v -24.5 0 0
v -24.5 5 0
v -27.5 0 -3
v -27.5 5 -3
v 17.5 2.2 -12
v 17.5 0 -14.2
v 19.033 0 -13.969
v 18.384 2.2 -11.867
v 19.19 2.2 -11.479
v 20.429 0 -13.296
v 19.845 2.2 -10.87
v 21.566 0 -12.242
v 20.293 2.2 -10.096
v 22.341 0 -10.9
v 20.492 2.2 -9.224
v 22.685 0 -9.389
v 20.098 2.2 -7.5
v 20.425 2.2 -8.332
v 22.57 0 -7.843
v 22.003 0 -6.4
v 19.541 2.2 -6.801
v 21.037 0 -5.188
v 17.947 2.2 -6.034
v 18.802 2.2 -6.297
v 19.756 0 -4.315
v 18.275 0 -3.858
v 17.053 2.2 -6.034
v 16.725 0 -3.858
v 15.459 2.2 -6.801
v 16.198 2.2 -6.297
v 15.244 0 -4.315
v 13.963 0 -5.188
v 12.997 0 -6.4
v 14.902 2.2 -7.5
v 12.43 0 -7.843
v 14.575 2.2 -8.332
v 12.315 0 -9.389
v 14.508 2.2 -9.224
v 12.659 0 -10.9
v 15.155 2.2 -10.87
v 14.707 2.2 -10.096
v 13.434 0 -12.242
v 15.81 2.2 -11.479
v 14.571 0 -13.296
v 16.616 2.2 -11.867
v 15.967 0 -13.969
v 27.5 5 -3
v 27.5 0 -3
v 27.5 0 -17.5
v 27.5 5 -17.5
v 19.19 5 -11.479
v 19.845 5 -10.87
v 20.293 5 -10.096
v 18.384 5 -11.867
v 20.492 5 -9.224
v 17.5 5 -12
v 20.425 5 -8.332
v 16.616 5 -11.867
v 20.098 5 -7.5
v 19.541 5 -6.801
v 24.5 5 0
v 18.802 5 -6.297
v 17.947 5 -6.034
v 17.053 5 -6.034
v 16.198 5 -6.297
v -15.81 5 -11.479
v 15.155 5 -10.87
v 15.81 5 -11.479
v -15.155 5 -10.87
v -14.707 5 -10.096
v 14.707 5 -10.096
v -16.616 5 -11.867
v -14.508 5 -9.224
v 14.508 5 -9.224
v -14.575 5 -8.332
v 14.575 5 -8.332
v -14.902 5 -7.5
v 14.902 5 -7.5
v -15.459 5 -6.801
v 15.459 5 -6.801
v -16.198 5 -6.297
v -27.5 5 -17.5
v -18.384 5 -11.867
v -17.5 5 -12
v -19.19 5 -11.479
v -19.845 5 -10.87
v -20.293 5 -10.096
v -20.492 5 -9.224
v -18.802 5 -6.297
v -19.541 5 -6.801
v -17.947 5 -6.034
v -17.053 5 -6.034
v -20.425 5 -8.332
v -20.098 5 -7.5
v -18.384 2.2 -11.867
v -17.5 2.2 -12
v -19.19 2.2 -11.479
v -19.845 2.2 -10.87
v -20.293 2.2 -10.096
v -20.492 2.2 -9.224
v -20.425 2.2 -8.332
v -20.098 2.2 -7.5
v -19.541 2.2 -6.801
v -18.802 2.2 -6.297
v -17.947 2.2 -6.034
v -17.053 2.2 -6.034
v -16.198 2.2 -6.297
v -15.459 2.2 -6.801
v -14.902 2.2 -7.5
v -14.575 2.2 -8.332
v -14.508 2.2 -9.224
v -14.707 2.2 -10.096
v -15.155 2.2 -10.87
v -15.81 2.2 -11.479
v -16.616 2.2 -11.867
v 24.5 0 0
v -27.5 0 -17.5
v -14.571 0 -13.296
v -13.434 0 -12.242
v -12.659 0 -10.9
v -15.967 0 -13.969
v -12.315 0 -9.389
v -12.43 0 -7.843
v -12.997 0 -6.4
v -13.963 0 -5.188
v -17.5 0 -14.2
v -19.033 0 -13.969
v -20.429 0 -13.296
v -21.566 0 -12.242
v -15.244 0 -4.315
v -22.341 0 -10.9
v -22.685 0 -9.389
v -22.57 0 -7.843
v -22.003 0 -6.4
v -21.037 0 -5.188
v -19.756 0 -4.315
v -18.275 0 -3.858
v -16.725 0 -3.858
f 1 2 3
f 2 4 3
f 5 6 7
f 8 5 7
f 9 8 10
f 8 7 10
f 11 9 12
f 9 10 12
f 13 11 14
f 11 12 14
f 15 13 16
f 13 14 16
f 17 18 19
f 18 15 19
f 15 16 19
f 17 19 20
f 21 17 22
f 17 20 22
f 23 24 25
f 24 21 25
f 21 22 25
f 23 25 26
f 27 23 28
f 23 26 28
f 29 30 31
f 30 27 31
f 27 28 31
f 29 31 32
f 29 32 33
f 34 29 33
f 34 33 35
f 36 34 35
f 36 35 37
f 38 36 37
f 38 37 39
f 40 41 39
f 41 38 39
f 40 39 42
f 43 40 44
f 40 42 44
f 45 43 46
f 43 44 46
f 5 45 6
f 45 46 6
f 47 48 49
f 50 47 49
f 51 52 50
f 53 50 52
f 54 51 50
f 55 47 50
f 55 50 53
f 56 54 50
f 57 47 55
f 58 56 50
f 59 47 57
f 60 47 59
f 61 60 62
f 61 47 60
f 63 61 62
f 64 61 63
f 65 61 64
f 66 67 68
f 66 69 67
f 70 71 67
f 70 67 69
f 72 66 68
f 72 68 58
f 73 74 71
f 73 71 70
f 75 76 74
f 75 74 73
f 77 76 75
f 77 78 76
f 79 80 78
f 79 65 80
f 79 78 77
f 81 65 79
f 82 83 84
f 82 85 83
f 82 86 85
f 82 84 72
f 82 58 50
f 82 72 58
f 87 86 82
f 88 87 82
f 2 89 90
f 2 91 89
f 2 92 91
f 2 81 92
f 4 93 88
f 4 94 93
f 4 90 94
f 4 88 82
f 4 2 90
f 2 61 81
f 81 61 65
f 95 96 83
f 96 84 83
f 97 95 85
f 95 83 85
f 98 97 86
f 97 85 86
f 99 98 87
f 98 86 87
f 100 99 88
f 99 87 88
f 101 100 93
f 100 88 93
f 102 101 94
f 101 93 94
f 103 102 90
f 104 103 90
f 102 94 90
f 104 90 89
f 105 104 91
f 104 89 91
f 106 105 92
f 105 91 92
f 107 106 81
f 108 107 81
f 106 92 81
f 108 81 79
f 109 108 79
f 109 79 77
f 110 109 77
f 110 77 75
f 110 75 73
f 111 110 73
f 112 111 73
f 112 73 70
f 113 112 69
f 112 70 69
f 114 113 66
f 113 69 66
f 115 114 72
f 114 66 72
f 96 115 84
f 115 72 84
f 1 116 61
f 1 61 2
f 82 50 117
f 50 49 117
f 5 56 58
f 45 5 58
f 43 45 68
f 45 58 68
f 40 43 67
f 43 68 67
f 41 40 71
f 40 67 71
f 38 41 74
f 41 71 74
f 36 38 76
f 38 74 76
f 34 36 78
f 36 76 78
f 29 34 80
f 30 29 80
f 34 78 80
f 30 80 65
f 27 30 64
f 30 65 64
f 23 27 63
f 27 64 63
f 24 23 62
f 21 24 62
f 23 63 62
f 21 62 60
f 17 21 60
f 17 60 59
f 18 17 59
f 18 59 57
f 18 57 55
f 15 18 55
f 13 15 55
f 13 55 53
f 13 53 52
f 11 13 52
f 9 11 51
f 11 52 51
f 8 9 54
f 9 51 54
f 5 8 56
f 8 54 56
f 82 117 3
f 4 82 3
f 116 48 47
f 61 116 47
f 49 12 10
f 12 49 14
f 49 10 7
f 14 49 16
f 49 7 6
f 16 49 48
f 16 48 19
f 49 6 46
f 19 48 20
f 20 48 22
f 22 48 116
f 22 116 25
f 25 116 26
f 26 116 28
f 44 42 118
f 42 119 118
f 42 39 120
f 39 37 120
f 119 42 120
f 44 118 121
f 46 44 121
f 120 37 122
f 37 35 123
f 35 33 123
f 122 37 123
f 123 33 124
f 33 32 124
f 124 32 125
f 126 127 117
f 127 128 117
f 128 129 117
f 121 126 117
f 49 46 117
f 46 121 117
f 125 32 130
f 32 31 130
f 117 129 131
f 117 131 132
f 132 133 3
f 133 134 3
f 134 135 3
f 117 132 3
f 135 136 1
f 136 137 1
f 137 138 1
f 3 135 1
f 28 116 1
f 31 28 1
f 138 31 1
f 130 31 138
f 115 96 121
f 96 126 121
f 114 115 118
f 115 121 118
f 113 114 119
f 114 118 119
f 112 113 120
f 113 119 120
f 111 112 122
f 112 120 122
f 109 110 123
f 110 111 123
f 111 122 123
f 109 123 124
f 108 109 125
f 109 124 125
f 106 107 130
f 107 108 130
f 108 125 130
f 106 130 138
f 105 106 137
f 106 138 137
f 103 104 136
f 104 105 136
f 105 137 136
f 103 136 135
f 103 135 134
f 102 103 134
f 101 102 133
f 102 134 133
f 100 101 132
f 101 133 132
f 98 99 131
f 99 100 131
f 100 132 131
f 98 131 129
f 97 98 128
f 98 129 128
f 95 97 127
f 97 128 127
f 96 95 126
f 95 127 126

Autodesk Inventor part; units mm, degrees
ref_plane "YZ Plane" through (0, 0, 0) normal (1, 0, 0) x (0, 1, 0)
ref_plane "XZ Plane" through (0, 0, 0) normal (0, 1, 0) x (-1, 0, 0)
ref_plane "XY Plane" through (0, 0, 0) normal (0, 0, 1) x (1, 0, 0)
sketch "Sketch1" plane through (0, 0, 0) normal (0, 1, 0) x (-1, 0, 0)
  line L0 (-38.5, 0) -> (38.5, 0) projected
  line L1 (27.5, 0) -> (-27.5, 0)
  line L2 (-27.5, 0) -> (-27.5, -17.5)
  line L3 (-27.5, -17.5) -> (27.5, -17.5)
  line L4 (27.5, -17.5) -> (27.5, 0)
  line L5 (0, -21) -> (0, 3.5) projected
  dimension "d8" = 17.5
  dimension "d22" = 55
extrude "Extrusion1" add sketch "Sketch1" along normal blind 5
sketch "Sketch2" plane through (0, 0, 0) normal (0, -1, 0) x (1, 0, 0)
  line L0 (-27.5, 0) -> (27.5, 0) projected
  line L1 (27.5, 0) -> (27.5, -17.5) projected
  line L2 (-27.5, -17.5) -> (-27.5, 0) projected
  point P0 (17.5, -9)
  point P1 (-17.5, -9)
  dimension "d9" = 9
  dimension "d23" = 10
  dimension "d24" = 10
hole "Hole1" at (17.5, 0, -9) at (-17.5, 0, -9) direction (0, 1, 0) diameter 6 end through all countersink diameter 10.4 countersink angle 90
chamfer "Chamfer1" distance 3 angle 45 2 edges at (-27.5, 2.5, 0) (27.5, 2.5, 0)
equation "\"d24\" = d23"
properties part number "FixedJaw"
